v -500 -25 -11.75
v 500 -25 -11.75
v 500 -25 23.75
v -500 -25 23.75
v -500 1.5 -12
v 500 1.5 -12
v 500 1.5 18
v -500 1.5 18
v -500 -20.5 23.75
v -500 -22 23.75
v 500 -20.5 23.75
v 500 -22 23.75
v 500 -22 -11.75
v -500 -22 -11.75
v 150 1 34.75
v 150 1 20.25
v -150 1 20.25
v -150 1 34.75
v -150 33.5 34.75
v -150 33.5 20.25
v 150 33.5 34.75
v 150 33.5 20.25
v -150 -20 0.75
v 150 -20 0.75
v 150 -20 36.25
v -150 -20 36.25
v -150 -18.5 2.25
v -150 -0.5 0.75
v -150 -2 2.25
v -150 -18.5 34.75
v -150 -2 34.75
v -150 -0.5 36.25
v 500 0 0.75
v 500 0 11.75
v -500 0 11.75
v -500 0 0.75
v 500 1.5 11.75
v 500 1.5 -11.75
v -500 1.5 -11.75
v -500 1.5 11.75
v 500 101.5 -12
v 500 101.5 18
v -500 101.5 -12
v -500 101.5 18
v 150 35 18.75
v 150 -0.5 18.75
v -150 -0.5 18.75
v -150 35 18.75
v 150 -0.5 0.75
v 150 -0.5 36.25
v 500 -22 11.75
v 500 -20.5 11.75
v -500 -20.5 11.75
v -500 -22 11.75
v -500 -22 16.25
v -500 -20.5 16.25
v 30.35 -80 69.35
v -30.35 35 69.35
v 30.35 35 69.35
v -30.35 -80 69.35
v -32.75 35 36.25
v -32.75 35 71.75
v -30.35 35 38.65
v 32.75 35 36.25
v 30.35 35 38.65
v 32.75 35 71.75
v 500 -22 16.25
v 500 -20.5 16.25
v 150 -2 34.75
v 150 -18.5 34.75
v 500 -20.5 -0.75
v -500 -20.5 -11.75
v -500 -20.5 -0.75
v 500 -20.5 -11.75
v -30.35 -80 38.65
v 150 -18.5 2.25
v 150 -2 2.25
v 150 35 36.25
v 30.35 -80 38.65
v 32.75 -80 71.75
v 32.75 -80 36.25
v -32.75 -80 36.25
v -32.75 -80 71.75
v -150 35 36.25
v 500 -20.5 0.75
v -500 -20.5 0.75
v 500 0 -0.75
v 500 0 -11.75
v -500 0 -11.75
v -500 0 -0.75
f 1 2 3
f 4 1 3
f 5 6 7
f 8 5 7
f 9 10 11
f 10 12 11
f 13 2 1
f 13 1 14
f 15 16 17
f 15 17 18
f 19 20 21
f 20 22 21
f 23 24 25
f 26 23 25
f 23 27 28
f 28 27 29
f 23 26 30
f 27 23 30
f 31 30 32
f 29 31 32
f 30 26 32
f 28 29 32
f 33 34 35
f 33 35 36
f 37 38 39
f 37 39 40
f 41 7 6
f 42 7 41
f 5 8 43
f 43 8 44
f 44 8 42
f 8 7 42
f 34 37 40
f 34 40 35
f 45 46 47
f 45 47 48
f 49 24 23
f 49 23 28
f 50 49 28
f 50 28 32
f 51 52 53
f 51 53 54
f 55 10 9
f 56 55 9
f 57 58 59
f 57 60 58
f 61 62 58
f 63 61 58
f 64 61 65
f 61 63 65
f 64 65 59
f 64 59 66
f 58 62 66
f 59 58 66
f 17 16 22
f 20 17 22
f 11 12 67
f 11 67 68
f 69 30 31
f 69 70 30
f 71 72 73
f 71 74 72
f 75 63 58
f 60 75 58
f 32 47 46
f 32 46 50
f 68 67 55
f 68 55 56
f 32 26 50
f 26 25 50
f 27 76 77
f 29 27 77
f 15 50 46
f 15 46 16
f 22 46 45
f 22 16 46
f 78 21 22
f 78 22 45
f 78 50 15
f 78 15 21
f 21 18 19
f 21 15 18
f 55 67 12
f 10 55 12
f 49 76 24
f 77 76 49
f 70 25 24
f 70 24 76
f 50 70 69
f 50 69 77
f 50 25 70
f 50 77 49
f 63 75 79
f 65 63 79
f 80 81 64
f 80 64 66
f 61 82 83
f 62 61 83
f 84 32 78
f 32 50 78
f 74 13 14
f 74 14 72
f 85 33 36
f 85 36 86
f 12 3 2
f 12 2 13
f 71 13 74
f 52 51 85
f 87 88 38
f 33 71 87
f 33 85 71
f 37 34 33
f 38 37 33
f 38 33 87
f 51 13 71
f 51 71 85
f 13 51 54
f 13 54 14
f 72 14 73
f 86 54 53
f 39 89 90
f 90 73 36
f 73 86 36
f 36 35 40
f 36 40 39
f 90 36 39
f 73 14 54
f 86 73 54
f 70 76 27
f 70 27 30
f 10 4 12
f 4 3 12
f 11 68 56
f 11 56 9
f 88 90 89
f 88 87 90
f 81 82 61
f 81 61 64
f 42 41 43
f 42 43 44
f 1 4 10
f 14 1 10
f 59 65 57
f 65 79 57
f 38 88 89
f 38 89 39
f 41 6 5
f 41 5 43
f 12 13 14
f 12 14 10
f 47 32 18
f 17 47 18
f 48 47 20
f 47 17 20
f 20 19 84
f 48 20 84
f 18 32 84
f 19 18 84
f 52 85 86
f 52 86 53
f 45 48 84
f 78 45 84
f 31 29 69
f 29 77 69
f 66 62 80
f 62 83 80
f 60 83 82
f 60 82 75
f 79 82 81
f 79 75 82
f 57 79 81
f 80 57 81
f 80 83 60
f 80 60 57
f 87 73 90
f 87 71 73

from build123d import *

# Parameters (mm, degrees)
F2_DEPTH       = 500
F3_W           = 19.5
F3_H           = 35.5
F3_W_2         = 16.5
F3_H_2         = 32.5
F4_DEPTH       = 150
F5_W           = 3
F5_H           = 35.5
F6_DEPTH       = 500
F7_W           = 1.5
F7_H           = 7.5
F8_DEPTH       = 500
F9_W           = 35.5
F9_H           = 17.5
F9_W_2         = 32.5
F9_H_2         = 14.5
F10_DEPTH      = 150
F11_W          = 65.5
F11_H          = 35.5
F11_W_2        = 60.7
F11_H_2        = 30.7
F12_DEPTH      = 80
F12_DEPTH_BACK = 35
F0_W           = 100
F0_H           = 30
F13_DEPTH      = 500


with BuildPart() as f2:
    # F1 (on Right) → F2 (new body, symmetric)
    with BuildSketch(Plane.YZ):
        Polygon((0, -0.75), (0, -11.75), (1.5, -11.75), (1.5, 11.75), (0, 11.75), (0, 0.75), (-20.5, 0.75), (-20.5, 11.75), (-22, 11.75), (-22, -11.75), (-20.5, -11.75), (-20.5, -0.75), align=None)
    extrude(amount=F2_DEPTH, both=True)


with BuildPart() as f4:
    # F3 (on Right) → F4 (new body, symmetric)
    with BuildSketch(Plane.YZ):
        with Locations((-10.25, 18.5)):
            Rectangle(F3_W, F3_H)
        with Locations((-10.25, 18.5)):
            Rectangle(F3_W_2, F3_H_2, mode=Mode.SUBTRACT)
    extrude(amount=F4_DEPTH, both=True)


with BuildPart() as f6:
    # F5 (on Right) → F6 (new body, symmetric)
    with BuildSketch(Plane.YZ):
        with Locations((-23.5, 6)):
            Rectangle(F5_W, F5_H)
    extrude(amount=F6_DEPTH, both=True)


with BuildPart() as f8:
    # F7 (on Right) → F8 (new body, symmetric)
    with BuildSketch(Plane.YZ):
        with Locations((-21.25, 20)):
            Rectangle(F7_W, F7_H)
    extrude(amount=F8_DEPTH, both=True)


with BuildPart() as f10:
    # F9 (on Right) → F10 (new body, symmetric)
    with BuildSketch(Plane.YZ):
        with Locations((17.25, 27.5)):
            Rectangle(F9_W, F9_H)
        with Locations((17.25, 27.5)):
            Rectangle(F9_W_2, F9_H_2, mode=Mode.SUBTRACT)
    extrude(amount=F10_DEPTH, both=True)


with BuildPart() as f12:
    # F11 (on Front) → F12 (new body, two sides)
    with BuildSketch(Plane.XZ) as f12_sk:
        with Locations((0, 54)):
            Rectangle(F11_W, F11_H)
        with Locations((0, 54)):
            Rectangle(F11_W_2, F11_H_2, mode=Mode.SUBTRACT)
    extrude(amount=F12_DEPTH)
    extrude(f12_sk.sketch, amount=-F12_DEPTH_BACK)


with BuildPart() as f13:
    # F0 (on Right) → F13 (new body, symmetric)
    with BuildSketch(Plane.YZ):
        with Locations((51.5, 3)):
            Rectangle(F0_W, F0_H)
    extrude(amount=F13_DEPTH, both=True)


solid = Compound([f2.part, f4.part, f6.part, f8.part, f10.part, f12.part, f13.part])
